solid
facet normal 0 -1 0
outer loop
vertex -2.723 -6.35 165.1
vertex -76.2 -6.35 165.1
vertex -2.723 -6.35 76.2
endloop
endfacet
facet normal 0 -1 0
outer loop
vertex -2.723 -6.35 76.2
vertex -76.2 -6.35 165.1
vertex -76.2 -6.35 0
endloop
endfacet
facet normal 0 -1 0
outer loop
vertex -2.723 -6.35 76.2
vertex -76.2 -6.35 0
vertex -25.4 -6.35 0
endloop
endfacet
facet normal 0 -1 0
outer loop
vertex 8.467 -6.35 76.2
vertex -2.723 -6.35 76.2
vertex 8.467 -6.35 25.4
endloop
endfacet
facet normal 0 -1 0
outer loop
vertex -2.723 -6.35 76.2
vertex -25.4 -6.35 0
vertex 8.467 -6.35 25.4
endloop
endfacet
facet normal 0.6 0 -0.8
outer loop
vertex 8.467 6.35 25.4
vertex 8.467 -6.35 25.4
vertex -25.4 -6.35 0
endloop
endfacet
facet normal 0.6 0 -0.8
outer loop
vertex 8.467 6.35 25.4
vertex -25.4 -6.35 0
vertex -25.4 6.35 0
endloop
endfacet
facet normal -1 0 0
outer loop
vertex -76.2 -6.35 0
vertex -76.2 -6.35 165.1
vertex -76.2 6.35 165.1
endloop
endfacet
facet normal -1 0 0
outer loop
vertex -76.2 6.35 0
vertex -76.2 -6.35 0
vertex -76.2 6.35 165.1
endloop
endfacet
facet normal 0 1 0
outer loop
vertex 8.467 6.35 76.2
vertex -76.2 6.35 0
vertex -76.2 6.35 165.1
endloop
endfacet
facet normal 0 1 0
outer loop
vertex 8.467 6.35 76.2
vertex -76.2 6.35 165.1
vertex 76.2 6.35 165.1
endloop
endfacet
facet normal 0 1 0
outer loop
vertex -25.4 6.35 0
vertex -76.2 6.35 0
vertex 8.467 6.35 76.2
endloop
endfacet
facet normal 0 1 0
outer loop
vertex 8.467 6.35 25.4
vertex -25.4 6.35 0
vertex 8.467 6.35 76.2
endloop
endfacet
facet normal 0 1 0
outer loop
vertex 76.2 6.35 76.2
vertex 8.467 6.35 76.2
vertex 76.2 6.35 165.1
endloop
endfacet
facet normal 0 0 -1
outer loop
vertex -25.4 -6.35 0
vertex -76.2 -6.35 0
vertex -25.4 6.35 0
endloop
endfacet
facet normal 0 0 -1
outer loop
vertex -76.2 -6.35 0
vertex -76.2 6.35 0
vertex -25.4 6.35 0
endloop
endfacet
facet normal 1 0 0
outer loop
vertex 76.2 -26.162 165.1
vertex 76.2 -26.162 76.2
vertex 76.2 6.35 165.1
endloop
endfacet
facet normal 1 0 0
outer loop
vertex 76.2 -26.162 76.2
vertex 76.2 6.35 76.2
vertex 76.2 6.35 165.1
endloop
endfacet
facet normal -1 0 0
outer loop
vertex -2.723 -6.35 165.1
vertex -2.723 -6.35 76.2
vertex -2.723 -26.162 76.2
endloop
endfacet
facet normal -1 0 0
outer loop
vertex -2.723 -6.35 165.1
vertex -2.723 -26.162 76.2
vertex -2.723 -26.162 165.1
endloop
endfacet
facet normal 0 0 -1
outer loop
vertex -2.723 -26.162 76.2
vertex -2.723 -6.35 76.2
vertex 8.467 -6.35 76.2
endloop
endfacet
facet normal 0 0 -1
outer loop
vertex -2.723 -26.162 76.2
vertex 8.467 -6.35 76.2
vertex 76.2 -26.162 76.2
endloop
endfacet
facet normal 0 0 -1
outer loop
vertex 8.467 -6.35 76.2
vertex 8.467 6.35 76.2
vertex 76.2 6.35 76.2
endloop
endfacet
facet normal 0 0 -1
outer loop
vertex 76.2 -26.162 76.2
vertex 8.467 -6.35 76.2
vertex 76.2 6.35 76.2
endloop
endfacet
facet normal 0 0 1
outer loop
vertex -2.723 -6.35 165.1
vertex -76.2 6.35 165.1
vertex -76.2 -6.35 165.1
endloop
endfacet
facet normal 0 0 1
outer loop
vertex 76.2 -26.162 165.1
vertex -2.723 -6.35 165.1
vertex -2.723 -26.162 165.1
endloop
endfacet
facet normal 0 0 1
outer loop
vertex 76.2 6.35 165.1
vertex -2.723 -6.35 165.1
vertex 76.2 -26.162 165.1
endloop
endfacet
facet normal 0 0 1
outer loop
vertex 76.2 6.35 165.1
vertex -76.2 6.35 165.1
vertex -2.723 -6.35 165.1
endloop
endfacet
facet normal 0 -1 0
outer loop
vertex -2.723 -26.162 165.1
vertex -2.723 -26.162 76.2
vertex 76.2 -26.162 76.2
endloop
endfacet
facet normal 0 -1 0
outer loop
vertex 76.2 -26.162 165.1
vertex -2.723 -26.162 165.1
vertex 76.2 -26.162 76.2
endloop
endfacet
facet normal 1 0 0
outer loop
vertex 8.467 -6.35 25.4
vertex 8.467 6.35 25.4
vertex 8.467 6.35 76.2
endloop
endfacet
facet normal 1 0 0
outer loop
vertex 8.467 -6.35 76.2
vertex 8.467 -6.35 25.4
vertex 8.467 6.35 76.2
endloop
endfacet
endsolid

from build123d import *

# Parameters (mm, degrees)
F0_W     = 152.4
F0_H     = 12.7
F1_DEPTH = 165.1
F2_SIZE2 = 76.2
F2_SIZE  = 101.6
F3_W     = 78.9234735198
F3_H     = 88.9
F4_DEPTH = 19.812
F6_DEPTH = 25.4


with BuildPart() as f1:
    # F0 (on Top) → F1 (new body)
    with BuildSketch(Plane.XY):
        Rectangle(F0_W, F0_H)
    extrude(amount=F1_DEPTH)

    # F2
    f2_edges = [f1.edges().sort_by_distance(p)[0] for p in [
        (76.2, 0, 0),
    ]]
    f2_side = f1.faces().sort_by_distance((0, 0, 0))[0]
    chamfer(f2_edges, length=F2_SIZE, length2=F2_SIZE2, reference=f2_side)

    # F3 (on face) → F4 (join)
    with BuildSketch(Plane.XZ.offset(6.35)):
        with Locations((36.7382632401, 120.65)):
            Rectangle(F3_W, F3_H)
    extrude(amount=F4_DEPTH)

    # F5 (on face) → F6 (cut)
    with BuildSketch(Plane(origin=(0, 6.35, 0), x_dir=(-1, 0, 0), z_dir=(0, 1, 0))):
        Polygon((-8.4666666667, 76.2), (-76.2, 76.2), (-8.4666666667, 25.4), align=None)
    extrude(amount=-F6_DEPTH, mode=Mode.SUBTRACT)


solid = f1.part
